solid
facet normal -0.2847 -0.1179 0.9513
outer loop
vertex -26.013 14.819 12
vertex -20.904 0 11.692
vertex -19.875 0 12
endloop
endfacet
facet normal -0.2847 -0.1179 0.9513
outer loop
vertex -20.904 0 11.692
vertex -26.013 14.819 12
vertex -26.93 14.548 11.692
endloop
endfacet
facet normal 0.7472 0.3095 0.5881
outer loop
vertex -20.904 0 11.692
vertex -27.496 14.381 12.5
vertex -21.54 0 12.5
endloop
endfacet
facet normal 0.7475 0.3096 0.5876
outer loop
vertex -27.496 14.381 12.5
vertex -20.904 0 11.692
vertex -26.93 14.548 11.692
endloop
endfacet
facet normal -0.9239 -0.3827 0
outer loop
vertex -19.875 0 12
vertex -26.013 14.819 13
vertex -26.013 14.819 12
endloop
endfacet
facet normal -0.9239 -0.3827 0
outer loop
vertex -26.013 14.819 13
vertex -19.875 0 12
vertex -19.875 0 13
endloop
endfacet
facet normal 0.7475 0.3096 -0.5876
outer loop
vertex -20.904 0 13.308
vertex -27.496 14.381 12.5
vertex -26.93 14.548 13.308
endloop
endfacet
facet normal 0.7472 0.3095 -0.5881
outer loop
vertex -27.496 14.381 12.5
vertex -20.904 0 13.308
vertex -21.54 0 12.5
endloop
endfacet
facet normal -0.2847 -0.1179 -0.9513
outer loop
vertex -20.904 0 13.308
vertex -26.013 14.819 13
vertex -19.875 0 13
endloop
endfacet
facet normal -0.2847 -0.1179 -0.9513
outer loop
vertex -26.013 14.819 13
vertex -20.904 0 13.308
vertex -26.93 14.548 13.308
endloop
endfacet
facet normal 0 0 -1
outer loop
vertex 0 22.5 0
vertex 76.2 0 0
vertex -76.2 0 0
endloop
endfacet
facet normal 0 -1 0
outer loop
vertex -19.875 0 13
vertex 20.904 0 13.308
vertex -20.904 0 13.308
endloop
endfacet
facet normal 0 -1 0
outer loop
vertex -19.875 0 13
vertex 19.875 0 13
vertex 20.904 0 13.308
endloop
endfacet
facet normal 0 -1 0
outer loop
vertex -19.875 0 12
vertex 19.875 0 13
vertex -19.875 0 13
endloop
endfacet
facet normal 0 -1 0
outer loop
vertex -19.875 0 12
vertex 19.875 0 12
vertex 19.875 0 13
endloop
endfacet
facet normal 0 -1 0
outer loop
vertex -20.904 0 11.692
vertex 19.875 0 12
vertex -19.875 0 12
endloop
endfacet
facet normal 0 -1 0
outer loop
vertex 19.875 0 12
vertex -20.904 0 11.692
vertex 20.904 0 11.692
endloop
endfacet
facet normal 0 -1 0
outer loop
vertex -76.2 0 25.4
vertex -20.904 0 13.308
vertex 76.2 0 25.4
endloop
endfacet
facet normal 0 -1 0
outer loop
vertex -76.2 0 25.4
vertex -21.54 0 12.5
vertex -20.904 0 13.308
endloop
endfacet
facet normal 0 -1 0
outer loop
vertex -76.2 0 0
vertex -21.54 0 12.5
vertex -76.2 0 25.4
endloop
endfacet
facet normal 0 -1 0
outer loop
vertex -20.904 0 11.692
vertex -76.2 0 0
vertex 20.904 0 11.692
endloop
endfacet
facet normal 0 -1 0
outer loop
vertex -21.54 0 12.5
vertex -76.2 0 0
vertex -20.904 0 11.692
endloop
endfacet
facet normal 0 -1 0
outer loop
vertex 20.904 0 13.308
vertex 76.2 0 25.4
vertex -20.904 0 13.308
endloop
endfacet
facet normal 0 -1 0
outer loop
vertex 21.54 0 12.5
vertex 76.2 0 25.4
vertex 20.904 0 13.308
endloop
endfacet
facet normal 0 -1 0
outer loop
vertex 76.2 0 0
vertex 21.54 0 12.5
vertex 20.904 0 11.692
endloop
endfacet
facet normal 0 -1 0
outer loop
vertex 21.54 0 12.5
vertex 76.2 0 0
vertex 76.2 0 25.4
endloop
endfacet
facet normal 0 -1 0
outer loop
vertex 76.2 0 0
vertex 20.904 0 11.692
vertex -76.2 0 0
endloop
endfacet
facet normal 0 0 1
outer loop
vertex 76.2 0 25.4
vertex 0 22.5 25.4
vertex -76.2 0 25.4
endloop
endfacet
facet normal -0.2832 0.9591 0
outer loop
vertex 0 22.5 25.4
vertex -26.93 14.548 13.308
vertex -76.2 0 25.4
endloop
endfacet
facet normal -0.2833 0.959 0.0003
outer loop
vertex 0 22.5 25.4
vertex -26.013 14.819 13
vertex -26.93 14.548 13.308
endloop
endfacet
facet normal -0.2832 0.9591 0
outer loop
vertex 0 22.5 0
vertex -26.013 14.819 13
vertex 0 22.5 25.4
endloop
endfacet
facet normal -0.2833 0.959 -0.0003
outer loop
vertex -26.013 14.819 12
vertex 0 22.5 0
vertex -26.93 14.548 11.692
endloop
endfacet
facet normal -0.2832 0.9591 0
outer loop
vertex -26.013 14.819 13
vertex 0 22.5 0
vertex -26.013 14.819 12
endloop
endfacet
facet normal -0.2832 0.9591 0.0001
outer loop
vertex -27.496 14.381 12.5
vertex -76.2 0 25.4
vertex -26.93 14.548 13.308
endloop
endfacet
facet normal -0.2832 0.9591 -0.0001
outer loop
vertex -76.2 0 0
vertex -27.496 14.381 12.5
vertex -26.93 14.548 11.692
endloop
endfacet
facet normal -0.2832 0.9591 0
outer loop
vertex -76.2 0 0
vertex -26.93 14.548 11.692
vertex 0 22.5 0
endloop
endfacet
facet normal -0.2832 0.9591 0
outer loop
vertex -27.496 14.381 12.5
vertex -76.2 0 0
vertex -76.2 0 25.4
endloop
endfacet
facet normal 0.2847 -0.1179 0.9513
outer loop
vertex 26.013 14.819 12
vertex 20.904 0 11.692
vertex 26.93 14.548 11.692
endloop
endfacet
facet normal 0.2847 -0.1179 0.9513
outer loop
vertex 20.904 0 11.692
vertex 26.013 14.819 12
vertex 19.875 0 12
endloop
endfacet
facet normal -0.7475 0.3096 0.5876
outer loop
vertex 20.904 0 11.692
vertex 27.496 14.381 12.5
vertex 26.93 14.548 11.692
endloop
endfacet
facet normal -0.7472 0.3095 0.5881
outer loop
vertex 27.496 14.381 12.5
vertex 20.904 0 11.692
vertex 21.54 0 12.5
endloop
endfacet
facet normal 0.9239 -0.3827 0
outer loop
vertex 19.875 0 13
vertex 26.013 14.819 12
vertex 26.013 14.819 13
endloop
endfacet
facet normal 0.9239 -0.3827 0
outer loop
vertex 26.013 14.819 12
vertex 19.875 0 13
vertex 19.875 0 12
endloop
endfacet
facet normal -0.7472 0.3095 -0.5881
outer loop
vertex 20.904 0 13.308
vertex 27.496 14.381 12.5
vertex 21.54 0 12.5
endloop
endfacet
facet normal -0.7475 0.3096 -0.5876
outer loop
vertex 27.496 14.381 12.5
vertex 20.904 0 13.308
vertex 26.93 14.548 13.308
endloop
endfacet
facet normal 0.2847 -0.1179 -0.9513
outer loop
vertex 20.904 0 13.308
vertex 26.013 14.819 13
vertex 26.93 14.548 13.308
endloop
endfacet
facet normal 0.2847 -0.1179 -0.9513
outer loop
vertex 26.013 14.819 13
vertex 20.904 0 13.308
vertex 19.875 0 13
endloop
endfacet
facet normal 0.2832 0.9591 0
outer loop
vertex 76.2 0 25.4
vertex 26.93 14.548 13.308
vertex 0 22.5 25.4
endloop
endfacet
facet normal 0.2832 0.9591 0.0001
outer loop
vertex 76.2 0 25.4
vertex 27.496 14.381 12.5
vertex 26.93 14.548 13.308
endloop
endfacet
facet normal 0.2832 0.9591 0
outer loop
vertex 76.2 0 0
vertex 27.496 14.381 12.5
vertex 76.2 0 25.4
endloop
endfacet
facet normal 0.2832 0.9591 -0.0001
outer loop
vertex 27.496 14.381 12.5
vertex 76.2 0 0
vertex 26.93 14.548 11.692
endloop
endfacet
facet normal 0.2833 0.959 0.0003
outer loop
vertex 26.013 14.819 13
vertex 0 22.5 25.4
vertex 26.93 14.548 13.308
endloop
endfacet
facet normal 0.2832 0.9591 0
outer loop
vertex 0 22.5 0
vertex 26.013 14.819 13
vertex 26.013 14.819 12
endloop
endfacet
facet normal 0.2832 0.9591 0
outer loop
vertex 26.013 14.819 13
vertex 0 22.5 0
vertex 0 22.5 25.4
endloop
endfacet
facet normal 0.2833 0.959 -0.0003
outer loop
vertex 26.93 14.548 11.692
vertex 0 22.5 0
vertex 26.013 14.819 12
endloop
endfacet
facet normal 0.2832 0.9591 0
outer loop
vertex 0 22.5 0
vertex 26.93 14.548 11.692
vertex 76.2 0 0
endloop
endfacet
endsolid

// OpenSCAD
/**
 * Simple triangles library
 *
 * Authors:
 *   - Eero 'rambo' af Heurlin 2010-
 *
 * License: LGPL 2.1
 */


/**
 * Standard right-angled triangle
 *
 * @param number  o_len  Length of the opposite side
 * @param number  a_len  Length of the adjacent side
 * @param number  depth  How wide/deep the triangle is in the 3rd dimension
 * @param boolean center Whether to center the triangle on the origin
 * @todo a better way ?
 */
module triangle(o_len, a_len, depth, center=false)
{
    centroid = center ? [-a_len/3, -o_len/3, -depth/2] : [0, 0, 0];
    translate(centroid) linear_extrude(height=depth)
    {
        polygon(points=[[0,0],[a_len,0],[0,o_len]], paths=[[0,1,2]]);
    }
}

/**
 * Standard right-angled triangle (tangent version)
 *
 * @param number  tan_angle Angle of adjacent to hypotenuse (ie tangent)
 * @param number  a_len     Length of the adjacent side
 * @param number  depth     How wide/deep the triangle is in the 3rd dimension
 * @param boolean center    Whether to center the triangle on the origin
 */
module a_triangle(tan_angle, a_len, depth, center=false)
{
    triangle(tan(tan_angle) * a_len, a_len, depth, center);
}

mirror(v=[1,0,0]){
       difference() {

triangle(22.5,76.2,25.4);
for (i = [-2:2])
    for (j = [-2:2])
        rotate([-90,0,-22.5])
            translate ([19.05,-12.5, 0]) //moves the holes 
                cylinder (d = 1.7, h = 50, center = true);
}
}

mirror(v=[0,0,0]){
       difference() {

triangle(22.5,76.2,25.4);
for (i = [-2:2])
    for (j = [-2:2])
        rotate([-90,0,-22.5])
            translate ([19.05,-12.5, 0]) //moves the holes 
                cylinder (d = 1.7, h = 50, center = true);
}
}
